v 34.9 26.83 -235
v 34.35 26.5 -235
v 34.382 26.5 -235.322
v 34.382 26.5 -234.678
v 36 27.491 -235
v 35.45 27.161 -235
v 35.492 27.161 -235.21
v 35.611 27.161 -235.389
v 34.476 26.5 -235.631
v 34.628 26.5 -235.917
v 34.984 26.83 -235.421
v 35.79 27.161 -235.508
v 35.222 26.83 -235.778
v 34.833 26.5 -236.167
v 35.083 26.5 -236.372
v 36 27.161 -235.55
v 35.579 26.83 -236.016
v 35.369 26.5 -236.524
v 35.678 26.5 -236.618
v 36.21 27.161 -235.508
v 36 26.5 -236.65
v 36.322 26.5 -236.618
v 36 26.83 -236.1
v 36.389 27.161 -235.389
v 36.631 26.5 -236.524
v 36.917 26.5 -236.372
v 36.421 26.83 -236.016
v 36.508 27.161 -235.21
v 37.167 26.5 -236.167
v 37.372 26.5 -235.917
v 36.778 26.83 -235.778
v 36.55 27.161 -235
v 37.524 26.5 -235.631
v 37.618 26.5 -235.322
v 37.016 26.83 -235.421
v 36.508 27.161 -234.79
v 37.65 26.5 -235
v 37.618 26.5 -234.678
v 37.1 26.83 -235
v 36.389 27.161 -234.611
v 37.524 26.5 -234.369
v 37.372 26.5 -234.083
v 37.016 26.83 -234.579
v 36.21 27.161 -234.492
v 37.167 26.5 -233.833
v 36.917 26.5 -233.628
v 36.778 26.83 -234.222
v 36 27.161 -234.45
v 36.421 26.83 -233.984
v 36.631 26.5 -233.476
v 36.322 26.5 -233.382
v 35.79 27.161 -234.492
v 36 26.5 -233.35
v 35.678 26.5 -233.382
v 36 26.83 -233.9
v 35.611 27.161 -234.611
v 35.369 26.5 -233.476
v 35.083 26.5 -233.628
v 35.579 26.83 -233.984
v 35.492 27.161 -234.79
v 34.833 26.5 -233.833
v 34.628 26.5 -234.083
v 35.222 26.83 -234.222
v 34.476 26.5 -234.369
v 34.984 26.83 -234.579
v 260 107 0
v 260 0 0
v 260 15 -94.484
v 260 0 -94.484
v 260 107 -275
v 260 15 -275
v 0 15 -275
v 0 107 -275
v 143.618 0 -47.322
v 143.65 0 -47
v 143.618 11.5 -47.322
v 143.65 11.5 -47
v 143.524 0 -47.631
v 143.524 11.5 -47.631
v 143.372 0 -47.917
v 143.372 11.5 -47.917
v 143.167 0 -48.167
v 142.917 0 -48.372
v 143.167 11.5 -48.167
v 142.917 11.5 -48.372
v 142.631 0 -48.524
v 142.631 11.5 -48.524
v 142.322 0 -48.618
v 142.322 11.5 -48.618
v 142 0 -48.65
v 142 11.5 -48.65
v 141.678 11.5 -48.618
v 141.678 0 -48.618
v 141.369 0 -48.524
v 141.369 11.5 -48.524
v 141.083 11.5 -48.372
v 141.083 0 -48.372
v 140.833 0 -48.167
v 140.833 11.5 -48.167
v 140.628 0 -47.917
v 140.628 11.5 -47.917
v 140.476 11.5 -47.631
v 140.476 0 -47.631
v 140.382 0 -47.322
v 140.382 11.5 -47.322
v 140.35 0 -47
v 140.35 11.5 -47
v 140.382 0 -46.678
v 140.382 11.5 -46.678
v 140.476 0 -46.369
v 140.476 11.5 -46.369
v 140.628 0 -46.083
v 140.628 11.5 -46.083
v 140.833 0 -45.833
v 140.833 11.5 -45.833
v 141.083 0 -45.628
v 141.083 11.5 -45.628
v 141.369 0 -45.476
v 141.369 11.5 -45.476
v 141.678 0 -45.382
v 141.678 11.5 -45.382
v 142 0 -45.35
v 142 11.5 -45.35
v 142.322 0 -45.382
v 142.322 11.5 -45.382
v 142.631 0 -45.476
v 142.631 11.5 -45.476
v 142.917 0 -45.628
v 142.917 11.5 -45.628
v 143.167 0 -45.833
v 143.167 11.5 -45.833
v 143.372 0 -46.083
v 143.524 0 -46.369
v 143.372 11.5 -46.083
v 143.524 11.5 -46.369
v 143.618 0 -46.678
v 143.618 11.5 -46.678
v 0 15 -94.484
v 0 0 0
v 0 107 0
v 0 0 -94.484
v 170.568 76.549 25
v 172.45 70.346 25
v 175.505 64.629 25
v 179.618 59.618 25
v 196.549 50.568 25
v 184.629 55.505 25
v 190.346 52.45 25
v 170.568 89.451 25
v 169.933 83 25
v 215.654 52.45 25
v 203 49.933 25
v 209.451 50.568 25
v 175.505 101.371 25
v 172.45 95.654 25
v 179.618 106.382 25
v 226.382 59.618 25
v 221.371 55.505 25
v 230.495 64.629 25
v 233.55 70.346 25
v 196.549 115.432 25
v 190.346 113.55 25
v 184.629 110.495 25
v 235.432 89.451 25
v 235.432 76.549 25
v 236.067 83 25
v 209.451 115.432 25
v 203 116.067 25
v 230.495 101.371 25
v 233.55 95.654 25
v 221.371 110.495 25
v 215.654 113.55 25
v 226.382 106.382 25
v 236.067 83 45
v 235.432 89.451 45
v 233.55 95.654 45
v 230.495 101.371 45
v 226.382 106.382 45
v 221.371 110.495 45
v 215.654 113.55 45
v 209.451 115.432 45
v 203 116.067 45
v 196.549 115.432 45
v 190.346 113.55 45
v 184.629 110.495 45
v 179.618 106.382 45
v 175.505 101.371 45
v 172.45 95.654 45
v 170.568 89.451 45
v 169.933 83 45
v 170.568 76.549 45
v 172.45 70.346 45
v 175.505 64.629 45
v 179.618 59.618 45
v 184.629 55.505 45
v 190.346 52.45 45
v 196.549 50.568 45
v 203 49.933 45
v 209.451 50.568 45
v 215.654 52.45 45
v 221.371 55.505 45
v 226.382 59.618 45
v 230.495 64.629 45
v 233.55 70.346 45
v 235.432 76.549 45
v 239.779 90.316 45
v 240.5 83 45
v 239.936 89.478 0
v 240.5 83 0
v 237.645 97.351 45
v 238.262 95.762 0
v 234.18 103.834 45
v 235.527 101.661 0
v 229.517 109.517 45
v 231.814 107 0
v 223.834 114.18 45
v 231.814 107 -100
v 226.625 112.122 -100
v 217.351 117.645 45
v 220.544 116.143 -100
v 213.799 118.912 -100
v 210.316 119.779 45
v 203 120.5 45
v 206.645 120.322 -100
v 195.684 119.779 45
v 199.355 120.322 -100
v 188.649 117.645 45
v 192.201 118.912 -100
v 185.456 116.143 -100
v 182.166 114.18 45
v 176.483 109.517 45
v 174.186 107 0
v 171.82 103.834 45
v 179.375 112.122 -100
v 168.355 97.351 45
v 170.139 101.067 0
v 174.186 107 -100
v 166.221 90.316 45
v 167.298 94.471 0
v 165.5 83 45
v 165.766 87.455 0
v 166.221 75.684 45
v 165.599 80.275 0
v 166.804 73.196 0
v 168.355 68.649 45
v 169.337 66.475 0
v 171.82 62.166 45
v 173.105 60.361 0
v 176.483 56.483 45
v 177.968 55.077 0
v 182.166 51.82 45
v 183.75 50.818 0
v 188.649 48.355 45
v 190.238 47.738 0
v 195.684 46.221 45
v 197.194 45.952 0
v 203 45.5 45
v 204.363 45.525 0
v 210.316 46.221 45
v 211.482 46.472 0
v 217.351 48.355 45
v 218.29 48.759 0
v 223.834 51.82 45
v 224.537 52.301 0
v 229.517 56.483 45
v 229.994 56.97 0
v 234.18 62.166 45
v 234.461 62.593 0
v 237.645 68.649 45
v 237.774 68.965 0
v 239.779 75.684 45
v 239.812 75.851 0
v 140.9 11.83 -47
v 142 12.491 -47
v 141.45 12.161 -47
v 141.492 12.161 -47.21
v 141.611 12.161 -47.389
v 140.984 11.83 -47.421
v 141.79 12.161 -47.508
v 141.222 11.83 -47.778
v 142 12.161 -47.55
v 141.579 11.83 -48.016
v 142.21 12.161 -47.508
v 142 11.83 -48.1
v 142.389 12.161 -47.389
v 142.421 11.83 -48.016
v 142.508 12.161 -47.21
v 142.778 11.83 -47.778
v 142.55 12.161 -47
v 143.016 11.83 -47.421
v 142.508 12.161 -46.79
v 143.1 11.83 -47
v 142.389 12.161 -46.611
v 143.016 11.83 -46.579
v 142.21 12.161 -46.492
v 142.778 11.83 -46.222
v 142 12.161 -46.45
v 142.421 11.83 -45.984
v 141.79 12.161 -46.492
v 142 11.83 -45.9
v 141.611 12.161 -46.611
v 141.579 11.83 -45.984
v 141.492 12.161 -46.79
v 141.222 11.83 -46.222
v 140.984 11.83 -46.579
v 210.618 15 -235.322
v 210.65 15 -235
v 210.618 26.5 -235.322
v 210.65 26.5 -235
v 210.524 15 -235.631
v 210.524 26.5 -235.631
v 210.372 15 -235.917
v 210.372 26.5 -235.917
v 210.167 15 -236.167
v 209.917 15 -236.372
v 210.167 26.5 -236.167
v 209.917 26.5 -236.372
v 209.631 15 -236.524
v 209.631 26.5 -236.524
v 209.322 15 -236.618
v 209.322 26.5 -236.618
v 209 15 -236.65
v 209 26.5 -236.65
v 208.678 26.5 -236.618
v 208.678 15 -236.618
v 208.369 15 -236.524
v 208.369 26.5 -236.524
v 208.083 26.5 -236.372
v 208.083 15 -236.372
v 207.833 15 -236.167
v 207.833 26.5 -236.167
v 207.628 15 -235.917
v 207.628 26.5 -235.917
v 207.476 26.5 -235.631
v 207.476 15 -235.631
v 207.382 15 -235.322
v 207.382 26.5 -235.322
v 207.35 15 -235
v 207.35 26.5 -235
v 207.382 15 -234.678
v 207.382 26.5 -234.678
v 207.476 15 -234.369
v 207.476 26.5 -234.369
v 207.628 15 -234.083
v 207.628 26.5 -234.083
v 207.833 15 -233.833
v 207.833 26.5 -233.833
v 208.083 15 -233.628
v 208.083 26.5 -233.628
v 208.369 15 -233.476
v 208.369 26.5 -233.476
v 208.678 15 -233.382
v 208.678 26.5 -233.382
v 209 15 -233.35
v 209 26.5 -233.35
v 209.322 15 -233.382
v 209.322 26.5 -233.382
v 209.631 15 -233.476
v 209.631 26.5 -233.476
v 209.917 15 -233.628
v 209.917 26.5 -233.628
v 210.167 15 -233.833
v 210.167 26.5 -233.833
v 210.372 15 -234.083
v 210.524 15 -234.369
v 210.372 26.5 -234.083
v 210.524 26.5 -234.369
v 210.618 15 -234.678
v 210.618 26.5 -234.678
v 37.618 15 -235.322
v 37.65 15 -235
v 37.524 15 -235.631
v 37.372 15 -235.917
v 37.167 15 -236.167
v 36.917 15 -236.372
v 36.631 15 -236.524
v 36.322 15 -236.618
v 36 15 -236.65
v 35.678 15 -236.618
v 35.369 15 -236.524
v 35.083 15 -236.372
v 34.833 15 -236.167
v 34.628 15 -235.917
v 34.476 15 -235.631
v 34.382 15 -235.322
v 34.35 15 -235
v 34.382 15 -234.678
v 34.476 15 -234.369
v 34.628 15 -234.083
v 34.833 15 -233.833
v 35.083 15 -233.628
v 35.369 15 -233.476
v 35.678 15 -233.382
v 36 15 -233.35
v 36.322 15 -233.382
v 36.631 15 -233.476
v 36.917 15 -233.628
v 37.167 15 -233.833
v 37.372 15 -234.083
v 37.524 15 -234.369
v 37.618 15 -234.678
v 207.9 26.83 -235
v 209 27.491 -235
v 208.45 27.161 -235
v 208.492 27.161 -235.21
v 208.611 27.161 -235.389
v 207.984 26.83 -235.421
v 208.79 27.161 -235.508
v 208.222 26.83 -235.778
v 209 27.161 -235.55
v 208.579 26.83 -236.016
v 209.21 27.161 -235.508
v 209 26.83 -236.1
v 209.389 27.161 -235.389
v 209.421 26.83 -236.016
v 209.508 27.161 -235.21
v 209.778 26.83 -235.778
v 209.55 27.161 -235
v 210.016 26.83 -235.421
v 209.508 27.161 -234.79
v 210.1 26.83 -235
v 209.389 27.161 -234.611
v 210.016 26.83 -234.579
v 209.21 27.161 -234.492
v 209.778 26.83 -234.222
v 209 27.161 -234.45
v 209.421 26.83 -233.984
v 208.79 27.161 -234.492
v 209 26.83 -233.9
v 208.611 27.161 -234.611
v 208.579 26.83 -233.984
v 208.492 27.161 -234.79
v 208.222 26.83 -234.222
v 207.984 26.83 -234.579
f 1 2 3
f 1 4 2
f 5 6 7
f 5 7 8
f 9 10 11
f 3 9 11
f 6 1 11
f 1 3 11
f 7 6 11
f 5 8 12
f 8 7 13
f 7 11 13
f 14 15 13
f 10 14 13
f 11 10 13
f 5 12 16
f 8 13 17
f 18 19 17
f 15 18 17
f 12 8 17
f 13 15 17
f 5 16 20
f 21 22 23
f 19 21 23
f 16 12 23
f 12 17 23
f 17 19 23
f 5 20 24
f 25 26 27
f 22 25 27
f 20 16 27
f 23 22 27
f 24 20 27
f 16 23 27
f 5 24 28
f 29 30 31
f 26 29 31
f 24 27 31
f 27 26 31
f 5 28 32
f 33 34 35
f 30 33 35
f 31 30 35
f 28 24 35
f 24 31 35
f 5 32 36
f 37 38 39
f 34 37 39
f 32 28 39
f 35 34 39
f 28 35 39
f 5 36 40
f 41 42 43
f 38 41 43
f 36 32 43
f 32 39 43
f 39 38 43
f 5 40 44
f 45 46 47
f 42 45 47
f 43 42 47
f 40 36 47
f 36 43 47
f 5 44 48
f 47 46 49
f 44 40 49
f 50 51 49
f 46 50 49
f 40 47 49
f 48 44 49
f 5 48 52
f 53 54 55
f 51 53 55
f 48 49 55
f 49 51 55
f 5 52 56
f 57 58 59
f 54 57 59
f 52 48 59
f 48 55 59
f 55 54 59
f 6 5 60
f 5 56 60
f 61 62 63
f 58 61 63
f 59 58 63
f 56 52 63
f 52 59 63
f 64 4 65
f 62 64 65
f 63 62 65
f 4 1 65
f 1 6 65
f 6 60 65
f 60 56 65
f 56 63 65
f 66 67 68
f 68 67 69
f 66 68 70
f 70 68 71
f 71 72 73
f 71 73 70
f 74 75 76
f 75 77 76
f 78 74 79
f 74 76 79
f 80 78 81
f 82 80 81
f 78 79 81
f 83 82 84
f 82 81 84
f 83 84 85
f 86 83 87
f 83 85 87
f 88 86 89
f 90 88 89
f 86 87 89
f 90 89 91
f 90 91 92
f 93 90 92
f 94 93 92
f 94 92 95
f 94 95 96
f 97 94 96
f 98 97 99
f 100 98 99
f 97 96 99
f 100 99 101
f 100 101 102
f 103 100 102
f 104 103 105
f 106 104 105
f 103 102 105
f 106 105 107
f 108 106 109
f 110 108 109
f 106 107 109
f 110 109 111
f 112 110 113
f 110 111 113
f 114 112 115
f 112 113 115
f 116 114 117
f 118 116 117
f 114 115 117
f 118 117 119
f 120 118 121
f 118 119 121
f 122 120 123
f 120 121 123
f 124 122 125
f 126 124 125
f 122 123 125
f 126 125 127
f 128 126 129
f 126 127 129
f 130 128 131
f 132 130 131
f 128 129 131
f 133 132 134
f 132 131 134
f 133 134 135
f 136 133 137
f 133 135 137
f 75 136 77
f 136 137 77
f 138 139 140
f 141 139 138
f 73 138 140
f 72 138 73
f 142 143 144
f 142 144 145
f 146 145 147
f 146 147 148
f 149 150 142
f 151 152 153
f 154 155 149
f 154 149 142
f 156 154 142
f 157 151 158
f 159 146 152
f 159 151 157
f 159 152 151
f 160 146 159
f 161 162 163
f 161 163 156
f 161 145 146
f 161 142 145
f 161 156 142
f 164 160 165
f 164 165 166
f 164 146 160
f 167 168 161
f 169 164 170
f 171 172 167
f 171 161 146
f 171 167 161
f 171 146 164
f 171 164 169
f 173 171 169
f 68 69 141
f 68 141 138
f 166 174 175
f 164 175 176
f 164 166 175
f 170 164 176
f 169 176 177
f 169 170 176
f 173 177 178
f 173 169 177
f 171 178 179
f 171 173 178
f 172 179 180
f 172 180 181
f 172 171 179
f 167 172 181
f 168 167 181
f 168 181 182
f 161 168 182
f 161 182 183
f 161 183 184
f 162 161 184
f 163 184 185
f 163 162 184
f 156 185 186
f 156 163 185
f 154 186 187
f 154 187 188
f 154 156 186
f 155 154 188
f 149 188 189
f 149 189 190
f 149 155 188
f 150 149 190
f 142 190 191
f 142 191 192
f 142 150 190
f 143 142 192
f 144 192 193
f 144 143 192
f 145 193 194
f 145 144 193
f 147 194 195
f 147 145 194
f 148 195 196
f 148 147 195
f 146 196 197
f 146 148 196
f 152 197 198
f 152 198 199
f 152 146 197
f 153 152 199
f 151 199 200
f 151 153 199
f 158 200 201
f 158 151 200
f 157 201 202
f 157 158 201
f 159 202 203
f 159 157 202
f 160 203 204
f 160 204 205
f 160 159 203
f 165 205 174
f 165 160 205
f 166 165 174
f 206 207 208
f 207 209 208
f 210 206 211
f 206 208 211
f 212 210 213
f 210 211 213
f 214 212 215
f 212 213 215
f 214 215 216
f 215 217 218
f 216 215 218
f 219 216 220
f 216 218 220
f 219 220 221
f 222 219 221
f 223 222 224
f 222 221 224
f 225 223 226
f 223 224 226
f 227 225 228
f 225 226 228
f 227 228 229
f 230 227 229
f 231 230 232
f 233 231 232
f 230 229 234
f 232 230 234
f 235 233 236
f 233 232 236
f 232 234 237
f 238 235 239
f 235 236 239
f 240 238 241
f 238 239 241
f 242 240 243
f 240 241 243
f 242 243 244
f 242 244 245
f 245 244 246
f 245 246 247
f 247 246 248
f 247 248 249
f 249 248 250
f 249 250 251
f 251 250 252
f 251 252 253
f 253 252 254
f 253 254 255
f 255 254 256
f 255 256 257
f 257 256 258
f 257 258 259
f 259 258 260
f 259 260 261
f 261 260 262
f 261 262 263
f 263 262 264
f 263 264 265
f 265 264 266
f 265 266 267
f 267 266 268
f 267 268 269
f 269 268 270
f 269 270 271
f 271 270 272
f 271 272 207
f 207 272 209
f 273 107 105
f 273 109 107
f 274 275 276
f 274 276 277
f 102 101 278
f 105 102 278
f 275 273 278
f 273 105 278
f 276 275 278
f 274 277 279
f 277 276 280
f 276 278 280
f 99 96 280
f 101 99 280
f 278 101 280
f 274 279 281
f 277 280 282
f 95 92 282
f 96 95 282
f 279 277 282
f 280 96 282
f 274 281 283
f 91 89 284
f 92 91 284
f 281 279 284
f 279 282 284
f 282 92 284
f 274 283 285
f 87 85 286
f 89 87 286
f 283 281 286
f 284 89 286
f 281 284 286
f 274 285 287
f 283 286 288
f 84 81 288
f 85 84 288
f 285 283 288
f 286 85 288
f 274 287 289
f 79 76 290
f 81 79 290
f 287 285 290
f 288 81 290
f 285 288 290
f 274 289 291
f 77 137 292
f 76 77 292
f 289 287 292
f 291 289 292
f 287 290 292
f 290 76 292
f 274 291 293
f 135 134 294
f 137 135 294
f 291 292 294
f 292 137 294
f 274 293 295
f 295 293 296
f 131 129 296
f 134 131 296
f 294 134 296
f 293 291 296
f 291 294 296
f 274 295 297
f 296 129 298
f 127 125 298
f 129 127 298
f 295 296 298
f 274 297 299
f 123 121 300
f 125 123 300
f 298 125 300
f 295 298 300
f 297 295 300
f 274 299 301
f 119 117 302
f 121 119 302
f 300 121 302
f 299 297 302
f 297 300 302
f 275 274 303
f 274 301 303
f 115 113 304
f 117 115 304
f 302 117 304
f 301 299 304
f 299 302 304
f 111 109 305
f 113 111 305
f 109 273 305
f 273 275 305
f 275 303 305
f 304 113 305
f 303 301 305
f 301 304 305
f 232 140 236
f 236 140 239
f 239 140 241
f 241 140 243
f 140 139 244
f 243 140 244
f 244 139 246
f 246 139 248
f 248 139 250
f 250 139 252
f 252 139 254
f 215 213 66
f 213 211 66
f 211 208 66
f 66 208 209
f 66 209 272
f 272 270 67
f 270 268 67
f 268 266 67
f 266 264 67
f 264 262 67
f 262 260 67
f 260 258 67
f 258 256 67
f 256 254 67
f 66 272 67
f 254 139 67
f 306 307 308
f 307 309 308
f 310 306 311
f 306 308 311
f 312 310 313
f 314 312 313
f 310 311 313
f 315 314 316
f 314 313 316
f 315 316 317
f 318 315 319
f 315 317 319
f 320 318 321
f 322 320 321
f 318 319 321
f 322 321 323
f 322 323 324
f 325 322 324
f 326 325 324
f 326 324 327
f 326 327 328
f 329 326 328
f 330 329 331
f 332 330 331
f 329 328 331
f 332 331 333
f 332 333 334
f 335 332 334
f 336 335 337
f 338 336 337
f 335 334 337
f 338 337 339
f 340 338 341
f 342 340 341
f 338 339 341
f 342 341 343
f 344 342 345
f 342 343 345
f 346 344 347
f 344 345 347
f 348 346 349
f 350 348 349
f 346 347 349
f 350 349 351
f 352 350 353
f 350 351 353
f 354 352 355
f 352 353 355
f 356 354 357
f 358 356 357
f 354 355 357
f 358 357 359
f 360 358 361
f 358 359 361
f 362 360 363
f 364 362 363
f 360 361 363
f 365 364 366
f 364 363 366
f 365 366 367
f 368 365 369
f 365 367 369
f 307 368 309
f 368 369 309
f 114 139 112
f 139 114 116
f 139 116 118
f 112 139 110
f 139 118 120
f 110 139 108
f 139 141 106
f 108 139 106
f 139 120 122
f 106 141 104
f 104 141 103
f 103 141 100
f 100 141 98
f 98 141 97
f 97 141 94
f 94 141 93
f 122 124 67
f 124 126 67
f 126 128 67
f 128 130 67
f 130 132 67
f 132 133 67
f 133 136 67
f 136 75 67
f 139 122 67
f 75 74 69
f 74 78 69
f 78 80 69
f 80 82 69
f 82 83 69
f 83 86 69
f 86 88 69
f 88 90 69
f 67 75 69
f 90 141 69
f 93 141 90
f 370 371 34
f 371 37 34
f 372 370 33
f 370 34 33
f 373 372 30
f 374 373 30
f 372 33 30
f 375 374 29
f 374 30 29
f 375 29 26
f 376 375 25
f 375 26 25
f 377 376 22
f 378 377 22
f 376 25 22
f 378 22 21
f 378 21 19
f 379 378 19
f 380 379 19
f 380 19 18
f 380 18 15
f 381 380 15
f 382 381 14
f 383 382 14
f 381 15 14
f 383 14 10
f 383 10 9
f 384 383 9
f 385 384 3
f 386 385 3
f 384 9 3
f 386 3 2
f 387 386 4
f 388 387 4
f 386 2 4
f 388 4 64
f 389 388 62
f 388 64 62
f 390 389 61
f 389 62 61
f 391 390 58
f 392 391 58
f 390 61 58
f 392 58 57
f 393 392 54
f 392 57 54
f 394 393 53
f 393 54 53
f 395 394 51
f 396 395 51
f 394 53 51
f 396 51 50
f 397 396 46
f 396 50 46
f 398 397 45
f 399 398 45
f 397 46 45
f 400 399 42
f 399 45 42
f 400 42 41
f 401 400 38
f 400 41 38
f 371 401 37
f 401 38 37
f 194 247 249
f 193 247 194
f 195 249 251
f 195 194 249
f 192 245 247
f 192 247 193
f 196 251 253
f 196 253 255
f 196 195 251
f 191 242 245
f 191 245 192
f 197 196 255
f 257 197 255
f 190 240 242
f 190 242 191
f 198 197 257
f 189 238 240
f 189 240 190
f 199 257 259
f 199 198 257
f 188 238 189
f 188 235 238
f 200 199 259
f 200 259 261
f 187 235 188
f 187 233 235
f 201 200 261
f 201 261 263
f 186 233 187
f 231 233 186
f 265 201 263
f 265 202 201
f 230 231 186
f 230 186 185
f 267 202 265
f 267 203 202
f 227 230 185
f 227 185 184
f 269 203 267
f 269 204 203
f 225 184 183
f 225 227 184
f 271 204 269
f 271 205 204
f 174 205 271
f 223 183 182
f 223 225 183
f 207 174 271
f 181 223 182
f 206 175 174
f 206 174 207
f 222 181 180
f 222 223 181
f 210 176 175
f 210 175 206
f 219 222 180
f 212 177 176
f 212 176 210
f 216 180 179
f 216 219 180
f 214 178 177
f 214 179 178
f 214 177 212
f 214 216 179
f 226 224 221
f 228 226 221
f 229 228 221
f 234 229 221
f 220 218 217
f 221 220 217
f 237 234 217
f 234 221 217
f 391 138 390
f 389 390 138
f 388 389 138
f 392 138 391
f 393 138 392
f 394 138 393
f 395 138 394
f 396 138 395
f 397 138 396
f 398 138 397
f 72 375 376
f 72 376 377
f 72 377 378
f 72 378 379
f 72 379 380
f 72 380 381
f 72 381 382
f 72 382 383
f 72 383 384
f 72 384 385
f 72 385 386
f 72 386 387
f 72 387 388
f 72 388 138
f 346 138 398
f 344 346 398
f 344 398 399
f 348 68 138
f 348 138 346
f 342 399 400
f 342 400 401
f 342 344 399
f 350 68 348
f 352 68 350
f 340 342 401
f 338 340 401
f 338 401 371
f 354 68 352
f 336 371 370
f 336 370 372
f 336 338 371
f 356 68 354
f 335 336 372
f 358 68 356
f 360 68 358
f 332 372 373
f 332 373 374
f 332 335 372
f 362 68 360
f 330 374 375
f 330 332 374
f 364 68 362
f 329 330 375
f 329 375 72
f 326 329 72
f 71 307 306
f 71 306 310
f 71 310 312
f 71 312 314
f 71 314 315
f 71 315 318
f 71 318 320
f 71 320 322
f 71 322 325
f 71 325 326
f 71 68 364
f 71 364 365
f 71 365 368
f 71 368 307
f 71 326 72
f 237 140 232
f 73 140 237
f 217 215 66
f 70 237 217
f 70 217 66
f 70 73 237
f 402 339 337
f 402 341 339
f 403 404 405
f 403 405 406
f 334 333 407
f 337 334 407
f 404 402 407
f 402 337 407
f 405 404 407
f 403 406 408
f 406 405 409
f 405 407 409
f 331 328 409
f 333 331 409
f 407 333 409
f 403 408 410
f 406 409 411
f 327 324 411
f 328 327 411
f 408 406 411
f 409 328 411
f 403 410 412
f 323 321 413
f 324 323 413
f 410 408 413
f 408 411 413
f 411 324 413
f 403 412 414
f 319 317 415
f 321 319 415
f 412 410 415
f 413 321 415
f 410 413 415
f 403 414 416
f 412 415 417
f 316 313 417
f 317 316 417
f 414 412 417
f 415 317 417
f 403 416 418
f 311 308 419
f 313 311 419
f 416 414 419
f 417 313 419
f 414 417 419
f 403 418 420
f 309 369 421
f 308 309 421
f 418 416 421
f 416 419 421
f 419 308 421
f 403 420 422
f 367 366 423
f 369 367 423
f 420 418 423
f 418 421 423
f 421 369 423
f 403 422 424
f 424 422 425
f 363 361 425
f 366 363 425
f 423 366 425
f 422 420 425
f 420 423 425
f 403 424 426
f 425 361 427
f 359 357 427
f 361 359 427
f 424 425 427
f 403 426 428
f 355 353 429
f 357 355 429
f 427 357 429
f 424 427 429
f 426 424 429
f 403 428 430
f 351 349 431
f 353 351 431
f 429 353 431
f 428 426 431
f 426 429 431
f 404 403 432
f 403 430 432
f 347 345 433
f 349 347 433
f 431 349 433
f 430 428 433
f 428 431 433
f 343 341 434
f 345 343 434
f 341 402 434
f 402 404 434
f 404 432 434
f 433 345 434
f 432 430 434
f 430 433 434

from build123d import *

# Parameters (mm, degrees)
SKETCH_1_W           = 260
SKETCH_1_H           = 275
EXTRUDE_1_DEPTH      = 107
EXTRUDE_2_DEPTH      = 25
EXTRUDE_2_DEPTH_BACK = 100
SKETCH_2_R           = 37.5
SKETCH_3_W           = 180.515861549
SKETCH_3_H           = 15
CUT_EXTRUDE_1_DEPTH  = 398.171562426
M4X0_7_1_D           = 3.3
M4X0_7_1_DEPTH       = 11.5
M4X0_7_1_TIP         = 0.991420021
M4X0_7_2_D           = 3.3
M4X0_7_2_DEPTH       = 11.5
M4X0_7_2_TIP         = 0.991420021
SKETCH_17_R          = 37.5
SKETCH_17_R_2        = 33.067386868
EXTRUDE_4_DEPTH      = 20


with BuildPart() as part:
    # 스케치1 → 보스-돌출1 (new body)
    with BuildSketch(Plane(origin=(0, 0, 0), x_dir=(1, 0, 0), z_dir=(0, 1, 0))):
        with Locations((130, 137.5)):
            Rectangle(SKETCH_1_W, SKETCH_1_H)
    extrude(amount=EXTRUDE_1_DEPTH)

    # 스케치2 → 보스-돌출2 (add, two sides: drawn at the far end of the back side and taken through both)
    with BuildSketch(Plane.XY.offset(-EXTRUDE_2_DEPTH_BACK)):
        with Locations((203, 83)):
            Circle(SKETCH_2_R)
    extrude(amount=EXTRUDE_2_DEPTH + EXTRUDE_2_DEPTH_BACK)

    # 스케치3 → 컷-돌출1 (cut, through all)
    with BuildSketch(Plane(origin=(260, 0, 0), x_dir=(0, 0, -1), z_dir=(1, 0, 0))):
        with Locations((184.742069226, 7.5)):
            Rectangle(SKETCH_3_W, SKETCH_3_H)
    extrude(amount=-CUT_EXTRUDE_1_DEPTH, mode=Mode.SUBTRACT)

    # M4x0.7 나사 구멍1
    with Locations(Plane(origin=(0, 15, 0), x_dir=(-1, 0, 0), z_dir=(0, -1, 0))):
        with Locations((-36, 235), (-209, 235)):
            Hole(M4X0_7_1_D / 2, depth=M4X0_7_1_DEPTH)
            with Locations((0, 0, -(M4X0_7_1_DEPTH + M4X0_7_1_TIP / 2))):  # 118° drill point
                Cone(0, M4X0_7_1_D / 2, M4X0_7_1_TIP, mode=Mode.SUBTRACT)

    # M4x0.7 나사 구멍2
    with Locations(Plane(origin=(0, 0, 0), x_dir=(-1, 0, 0), z_dir=(0, -1, 0))):
        with Locations((-142, 47)):
            Hole(M4X0_7_2_D / 2, depth=M4X0_7_2_DEPTH)
            with Locations((0, 0, -(M4X0_7_2_DEPTH + M4X0_7_2_TIP / 2))):  # 118° drill point
                Cone(0, M4X0_7_2_D / 2, M4X0_7_2_TIP, mode=Mode.SUBTRACT)

    # 스케치17 → 보스-돌출4 (add)
    with BuildSketch(Plane.XY.offset(25)):
        with Locations((203, 83)):
            Circle(SKETCH_17_R)
        with Locations((203, 83)):
            Circle(SKETCH_17_R_2, mode=Mode.SUBTRACT)
    extrude(amount=EXTRUDE_4_DEPTH)


solid = part.part
